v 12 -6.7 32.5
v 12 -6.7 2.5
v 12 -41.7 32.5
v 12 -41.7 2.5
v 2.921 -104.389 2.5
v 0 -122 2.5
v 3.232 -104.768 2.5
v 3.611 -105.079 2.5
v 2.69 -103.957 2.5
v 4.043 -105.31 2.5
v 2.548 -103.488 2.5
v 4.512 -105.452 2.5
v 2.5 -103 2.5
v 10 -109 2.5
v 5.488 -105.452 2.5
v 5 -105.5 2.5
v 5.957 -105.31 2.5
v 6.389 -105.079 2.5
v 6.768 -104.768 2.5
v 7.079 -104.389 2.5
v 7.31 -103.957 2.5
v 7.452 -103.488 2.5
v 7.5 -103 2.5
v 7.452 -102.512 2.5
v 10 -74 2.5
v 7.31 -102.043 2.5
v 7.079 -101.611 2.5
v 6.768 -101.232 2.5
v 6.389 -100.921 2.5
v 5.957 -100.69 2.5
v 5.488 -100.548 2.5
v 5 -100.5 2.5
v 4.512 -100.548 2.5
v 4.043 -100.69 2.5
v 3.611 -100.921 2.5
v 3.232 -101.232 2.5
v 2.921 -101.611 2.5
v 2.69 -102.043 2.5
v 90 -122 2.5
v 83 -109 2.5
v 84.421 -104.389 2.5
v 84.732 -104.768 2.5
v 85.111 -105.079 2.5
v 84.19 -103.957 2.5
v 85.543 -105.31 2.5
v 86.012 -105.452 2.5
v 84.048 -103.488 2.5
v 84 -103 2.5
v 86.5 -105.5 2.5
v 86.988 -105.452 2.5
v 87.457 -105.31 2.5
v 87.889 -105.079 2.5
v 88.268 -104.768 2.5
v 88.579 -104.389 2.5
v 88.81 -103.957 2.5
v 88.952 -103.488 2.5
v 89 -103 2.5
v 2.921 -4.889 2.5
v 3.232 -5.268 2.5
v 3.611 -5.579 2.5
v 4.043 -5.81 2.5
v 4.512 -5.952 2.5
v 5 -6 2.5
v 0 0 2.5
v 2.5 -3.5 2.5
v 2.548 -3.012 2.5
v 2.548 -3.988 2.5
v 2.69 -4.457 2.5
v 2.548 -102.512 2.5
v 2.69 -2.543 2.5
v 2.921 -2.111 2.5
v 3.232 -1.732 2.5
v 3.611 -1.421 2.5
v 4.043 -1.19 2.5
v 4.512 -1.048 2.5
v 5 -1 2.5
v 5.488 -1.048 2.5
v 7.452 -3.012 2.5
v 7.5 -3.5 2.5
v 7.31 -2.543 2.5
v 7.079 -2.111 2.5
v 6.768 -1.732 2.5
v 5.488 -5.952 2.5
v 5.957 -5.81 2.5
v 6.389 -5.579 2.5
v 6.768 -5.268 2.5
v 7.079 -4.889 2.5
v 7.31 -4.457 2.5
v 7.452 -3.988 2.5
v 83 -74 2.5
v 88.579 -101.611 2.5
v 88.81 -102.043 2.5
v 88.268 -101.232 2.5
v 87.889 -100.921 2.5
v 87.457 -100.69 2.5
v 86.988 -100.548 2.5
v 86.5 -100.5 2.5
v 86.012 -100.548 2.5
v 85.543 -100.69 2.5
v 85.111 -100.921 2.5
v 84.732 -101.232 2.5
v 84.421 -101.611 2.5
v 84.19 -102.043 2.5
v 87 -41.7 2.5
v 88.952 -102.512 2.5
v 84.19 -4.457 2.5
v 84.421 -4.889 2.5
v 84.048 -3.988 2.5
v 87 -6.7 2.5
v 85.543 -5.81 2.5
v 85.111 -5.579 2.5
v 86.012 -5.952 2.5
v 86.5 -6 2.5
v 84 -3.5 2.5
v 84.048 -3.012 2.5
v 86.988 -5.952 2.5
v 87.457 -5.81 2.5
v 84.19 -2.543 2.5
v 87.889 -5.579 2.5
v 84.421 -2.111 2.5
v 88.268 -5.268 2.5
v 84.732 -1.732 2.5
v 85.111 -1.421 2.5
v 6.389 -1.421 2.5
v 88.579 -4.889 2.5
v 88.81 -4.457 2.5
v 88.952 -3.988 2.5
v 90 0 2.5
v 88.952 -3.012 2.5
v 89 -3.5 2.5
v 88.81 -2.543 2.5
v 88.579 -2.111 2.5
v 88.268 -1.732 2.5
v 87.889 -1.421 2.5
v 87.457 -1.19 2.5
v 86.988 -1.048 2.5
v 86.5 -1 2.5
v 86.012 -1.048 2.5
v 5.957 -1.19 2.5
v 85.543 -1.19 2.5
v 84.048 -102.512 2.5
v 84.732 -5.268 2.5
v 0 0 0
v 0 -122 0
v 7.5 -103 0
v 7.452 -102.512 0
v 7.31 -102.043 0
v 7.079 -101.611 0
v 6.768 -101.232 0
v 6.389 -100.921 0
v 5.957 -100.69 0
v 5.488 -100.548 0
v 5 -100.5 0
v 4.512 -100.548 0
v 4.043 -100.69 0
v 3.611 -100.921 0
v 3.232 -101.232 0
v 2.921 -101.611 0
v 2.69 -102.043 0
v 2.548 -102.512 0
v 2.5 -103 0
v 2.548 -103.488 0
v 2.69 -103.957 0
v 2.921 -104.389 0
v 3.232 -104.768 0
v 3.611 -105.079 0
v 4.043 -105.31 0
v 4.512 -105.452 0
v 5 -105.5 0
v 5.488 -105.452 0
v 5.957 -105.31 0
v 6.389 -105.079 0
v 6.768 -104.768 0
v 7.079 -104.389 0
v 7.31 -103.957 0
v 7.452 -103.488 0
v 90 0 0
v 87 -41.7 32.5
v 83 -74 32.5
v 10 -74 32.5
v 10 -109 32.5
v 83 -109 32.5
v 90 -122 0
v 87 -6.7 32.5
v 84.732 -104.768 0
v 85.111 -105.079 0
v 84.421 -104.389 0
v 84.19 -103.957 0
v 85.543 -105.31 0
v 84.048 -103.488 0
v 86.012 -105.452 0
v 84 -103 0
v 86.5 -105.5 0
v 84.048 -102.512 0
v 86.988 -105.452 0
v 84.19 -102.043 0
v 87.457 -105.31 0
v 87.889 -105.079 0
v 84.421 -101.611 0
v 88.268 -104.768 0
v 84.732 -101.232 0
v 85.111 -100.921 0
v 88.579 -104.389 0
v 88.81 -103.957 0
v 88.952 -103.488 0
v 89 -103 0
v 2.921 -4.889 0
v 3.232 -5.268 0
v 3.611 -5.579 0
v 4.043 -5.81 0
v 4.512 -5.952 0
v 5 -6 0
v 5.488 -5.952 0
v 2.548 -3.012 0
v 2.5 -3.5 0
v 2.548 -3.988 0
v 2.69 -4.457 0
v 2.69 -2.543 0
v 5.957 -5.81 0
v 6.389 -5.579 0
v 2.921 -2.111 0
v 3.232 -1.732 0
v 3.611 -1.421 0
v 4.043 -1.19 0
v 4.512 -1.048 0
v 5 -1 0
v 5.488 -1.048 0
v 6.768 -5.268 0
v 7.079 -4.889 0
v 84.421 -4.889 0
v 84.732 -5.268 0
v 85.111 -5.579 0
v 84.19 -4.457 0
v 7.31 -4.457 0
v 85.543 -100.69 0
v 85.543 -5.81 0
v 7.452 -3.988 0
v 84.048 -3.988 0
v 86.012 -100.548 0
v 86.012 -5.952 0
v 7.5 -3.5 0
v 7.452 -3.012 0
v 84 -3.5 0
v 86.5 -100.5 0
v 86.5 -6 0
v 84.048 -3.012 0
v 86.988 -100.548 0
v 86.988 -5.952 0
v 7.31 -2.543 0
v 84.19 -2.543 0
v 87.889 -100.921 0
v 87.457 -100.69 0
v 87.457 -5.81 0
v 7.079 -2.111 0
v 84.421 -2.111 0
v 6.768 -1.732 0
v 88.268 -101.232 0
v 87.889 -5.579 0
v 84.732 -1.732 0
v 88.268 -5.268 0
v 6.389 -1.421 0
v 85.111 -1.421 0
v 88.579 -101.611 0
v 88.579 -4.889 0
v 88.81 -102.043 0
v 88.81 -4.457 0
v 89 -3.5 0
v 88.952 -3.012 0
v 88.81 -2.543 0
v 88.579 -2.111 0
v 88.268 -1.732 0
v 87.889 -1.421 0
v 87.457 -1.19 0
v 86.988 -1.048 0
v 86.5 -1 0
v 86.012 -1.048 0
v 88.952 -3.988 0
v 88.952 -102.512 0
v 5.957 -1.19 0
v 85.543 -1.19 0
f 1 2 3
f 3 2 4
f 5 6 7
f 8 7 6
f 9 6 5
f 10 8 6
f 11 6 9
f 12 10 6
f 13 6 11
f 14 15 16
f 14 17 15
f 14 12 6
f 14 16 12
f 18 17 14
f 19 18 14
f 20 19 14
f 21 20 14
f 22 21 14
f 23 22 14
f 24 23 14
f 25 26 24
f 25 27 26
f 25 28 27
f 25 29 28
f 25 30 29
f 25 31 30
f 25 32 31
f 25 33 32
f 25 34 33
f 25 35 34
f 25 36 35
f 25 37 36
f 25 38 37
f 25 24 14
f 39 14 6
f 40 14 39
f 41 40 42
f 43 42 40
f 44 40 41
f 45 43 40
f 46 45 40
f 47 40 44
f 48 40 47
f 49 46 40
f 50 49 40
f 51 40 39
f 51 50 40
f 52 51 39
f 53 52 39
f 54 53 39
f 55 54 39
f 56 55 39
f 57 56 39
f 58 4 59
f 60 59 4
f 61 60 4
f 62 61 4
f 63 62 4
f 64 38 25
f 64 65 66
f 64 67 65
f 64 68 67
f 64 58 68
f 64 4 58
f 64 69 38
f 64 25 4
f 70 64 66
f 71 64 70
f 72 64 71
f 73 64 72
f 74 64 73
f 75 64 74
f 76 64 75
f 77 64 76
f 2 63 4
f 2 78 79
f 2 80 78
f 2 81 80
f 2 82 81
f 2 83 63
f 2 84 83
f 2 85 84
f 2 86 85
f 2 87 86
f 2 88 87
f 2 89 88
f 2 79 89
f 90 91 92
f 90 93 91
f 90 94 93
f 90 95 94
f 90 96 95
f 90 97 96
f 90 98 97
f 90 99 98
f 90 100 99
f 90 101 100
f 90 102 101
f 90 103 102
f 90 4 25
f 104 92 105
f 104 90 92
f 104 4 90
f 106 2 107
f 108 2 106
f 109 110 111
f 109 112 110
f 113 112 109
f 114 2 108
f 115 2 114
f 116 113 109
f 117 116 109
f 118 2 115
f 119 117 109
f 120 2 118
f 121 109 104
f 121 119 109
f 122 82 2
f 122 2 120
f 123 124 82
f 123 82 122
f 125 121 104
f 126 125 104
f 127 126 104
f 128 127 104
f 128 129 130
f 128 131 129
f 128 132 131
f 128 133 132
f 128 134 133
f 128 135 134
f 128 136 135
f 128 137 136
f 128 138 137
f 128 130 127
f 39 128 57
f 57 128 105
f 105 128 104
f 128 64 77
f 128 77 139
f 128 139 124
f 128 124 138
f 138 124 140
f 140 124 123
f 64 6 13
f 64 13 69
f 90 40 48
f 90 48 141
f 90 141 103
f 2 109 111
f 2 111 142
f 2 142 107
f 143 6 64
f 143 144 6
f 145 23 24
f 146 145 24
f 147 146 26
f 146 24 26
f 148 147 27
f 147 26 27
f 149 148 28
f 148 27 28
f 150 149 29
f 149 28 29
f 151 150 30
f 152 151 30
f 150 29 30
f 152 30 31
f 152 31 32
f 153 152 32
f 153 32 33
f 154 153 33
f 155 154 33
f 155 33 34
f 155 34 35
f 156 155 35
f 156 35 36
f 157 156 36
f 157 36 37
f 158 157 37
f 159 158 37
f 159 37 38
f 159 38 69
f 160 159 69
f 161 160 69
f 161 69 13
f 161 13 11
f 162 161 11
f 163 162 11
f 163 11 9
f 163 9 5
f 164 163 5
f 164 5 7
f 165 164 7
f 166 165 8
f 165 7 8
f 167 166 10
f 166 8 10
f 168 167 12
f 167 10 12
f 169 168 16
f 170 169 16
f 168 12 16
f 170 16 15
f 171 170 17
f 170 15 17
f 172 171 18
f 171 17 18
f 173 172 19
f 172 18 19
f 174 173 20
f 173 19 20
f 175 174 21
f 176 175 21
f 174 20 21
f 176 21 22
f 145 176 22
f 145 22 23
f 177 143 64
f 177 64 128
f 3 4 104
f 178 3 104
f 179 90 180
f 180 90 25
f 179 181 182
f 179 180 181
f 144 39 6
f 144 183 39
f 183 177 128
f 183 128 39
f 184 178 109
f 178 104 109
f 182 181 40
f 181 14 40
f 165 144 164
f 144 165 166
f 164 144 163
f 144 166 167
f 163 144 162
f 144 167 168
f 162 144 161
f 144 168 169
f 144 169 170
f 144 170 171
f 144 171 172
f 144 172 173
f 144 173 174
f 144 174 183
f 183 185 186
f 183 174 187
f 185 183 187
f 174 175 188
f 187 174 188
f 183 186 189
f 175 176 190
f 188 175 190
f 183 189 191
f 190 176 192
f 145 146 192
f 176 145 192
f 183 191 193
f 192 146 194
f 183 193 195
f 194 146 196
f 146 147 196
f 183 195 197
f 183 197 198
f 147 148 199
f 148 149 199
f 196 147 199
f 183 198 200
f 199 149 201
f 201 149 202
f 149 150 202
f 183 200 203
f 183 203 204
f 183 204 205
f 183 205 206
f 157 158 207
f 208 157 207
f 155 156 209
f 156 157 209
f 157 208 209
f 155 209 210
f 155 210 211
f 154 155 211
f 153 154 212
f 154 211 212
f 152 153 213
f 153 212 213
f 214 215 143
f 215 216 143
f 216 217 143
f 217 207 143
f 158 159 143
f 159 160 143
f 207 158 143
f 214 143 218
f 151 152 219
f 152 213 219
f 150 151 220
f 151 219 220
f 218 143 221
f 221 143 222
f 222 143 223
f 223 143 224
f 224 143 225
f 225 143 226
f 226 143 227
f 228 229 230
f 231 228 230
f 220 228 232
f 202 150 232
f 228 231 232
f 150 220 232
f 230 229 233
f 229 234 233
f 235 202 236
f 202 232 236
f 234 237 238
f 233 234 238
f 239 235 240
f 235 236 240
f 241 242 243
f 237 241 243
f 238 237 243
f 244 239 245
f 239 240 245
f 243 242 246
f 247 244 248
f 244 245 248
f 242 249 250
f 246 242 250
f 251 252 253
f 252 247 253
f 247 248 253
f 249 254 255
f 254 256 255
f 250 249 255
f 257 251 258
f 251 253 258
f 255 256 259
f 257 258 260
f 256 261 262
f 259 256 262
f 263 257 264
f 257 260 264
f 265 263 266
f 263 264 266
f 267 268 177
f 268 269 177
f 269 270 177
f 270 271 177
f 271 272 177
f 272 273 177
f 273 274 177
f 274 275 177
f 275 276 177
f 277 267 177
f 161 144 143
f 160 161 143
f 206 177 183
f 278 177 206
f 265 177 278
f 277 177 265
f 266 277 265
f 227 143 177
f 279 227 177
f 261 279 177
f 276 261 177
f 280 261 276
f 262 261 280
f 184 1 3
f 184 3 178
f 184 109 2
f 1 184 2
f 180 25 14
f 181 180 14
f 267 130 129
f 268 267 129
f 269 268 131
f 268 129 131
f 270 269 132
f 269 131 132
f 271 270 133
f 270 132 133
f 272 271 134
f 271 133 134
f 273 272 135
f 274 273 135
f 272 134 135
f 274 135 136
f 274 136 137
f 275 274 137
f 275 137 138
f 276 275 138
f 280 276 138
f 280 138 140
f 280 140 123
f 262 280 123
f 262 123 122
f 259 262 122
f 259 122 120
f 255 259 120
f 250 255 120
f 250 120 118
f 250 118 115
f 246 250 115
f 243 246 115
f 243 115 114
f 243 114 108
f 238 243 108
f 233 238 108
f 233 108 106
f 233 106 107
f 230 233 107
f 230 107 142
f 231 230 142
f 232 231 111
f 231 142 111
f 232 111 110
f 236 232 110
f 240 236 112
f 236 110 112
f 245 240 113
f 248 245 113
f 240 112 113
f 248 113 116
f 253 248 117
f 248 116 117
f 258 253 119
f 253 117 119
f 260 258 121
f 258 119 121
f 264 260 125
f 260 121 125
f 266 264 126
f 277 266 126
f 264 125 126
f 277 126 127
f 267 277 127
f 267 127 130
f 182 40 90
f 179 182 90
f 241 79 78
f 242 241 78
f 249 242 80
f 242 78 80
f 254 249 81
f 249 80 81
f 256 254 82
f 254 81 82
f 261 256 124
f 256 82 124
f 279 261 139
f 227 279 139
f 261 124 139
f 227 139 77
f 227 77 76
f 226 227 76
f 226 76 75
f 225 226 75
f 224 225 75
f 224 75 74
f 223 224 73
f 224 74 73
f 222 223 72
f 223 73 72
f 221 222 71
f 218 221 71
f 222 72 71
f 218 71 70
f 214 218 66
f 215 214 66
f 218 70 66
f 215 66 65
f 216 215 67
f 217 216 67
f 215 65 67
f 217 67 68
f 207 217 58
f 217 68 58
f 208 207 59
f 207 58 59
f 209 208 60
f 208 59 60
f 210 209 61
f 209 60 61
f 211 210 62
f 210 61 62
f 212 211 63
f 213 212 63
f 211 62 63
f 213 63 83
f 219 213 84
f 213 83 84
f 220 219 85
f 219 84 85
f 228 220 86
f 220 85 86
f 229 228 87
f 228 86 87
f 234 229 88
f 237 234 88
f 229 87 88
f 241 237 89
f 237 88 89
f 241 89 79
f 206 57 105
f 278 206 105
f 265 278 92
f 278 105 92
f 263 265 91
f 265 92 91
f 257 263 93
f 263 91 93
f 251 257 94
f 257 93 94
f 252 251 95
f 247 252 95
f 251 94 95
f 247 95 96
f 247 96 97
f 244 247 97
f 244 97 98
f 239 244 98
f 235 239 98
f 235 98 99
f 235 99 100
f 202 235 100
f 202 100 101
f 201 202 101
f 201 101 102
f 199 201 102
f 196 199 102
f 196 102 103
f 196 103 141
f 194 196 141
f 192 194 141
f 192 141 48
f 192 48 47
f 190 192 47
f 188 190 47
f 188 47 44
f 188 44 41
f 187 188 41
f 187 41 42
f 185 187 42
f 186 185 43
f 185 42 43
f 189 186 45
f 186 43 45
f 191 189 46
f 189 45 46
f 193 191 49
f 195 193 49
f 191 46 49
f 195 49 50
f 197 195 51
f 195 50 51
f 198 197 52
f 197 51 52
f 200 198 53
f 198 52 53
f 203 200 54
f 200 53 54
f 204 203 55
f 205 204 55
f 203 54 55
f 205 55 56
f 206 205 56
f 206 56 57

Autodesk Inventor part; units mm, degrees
ref_plane "YZ Plane" through (0, 0, 0) normal (1, 0, 0) x (0, 1, 0)
ref_plane "XZ Plane" through (0, 0, 0) normal (0, 1, 0) x (-1, 0, 0)
ref_plane "XY Plane" through (0, 0, 0) normal (0, 0, 1) x (1, 0, 0)
sketch "Schizzo1" plane through (0, 0, 0) normal (0, 0, 1) x (1, 0, 0)
  line L0 (0, 0) -> (90, 0)
  line L1 (90, 0) -> (90, -122)
  line L2 (90, -122) -> (0, -122)
  line L3 (0, -122) -> (0, 0)
  dimension "d0" = 90
  dimension "d1" = 122
extrude "Estrusione1" add sketch "Schizzo1" along normal blind 2.5
sketch "Schizzo2" plane through (0, 0, 2.5) normal (0, 0, 1) x (1, 0, 0)
  line L0 (90, 0) -> (0, 0) projected
  line L1 (0, -122) -> (90, -122) projected
  line L2 (90, 0) -> (87, 0)
  line L3 (87, -6.7) -> (12, -6.7)
  line L4 (12, -6.7) -> (12, -41.7)
  line L5 (12, -41.7) -> (87, -41.7)
  line L6 (87, -41.7) -> (87, -6.7)
  line L7 (0, -122) -> (10, -122)
  line L8 (10, -109) -> (83, -109)
  line L9 (83, -109) -> (83, -74)
  line L10 (83, -74) -> (10, -74)
  line L11 (10, -74) -> (10, -109)
  point P0 (87, -6.7)
  dimension "d6" = 75
  dimension "d7" = 35
  dimension "d10" = 73
  dimension "d11" = 35
extrude "Estrusione2" add sketch "Schizzo2" along normal blind 30
sketch "Schizzo3" plane through (0, 0, 2.5) normal (0, 0, 1) x (1, 0, 0)
  line L0 (90, -122) -> (90, 0) projected
  line L1 (90, 0) -> (0, 0) projected
  line L2 (90, 0) -> (90, -6)
  line L3 (90, 0) -> (86.5, 0)
  circle A0 centre (86.5, -3.5) radius 2.5
  circle A1 centre (5, -3.5) radius 2.5
  circle A2 centre (5, -103) radius 2.5
  circle A3 centre (86.5, -103) radius 2.5
extrude "Estrusione3" cut sketch "Schizzo3" against normal up to surface (2.5 mm away)
properties part number "PCB" material "Plastica ABS"
